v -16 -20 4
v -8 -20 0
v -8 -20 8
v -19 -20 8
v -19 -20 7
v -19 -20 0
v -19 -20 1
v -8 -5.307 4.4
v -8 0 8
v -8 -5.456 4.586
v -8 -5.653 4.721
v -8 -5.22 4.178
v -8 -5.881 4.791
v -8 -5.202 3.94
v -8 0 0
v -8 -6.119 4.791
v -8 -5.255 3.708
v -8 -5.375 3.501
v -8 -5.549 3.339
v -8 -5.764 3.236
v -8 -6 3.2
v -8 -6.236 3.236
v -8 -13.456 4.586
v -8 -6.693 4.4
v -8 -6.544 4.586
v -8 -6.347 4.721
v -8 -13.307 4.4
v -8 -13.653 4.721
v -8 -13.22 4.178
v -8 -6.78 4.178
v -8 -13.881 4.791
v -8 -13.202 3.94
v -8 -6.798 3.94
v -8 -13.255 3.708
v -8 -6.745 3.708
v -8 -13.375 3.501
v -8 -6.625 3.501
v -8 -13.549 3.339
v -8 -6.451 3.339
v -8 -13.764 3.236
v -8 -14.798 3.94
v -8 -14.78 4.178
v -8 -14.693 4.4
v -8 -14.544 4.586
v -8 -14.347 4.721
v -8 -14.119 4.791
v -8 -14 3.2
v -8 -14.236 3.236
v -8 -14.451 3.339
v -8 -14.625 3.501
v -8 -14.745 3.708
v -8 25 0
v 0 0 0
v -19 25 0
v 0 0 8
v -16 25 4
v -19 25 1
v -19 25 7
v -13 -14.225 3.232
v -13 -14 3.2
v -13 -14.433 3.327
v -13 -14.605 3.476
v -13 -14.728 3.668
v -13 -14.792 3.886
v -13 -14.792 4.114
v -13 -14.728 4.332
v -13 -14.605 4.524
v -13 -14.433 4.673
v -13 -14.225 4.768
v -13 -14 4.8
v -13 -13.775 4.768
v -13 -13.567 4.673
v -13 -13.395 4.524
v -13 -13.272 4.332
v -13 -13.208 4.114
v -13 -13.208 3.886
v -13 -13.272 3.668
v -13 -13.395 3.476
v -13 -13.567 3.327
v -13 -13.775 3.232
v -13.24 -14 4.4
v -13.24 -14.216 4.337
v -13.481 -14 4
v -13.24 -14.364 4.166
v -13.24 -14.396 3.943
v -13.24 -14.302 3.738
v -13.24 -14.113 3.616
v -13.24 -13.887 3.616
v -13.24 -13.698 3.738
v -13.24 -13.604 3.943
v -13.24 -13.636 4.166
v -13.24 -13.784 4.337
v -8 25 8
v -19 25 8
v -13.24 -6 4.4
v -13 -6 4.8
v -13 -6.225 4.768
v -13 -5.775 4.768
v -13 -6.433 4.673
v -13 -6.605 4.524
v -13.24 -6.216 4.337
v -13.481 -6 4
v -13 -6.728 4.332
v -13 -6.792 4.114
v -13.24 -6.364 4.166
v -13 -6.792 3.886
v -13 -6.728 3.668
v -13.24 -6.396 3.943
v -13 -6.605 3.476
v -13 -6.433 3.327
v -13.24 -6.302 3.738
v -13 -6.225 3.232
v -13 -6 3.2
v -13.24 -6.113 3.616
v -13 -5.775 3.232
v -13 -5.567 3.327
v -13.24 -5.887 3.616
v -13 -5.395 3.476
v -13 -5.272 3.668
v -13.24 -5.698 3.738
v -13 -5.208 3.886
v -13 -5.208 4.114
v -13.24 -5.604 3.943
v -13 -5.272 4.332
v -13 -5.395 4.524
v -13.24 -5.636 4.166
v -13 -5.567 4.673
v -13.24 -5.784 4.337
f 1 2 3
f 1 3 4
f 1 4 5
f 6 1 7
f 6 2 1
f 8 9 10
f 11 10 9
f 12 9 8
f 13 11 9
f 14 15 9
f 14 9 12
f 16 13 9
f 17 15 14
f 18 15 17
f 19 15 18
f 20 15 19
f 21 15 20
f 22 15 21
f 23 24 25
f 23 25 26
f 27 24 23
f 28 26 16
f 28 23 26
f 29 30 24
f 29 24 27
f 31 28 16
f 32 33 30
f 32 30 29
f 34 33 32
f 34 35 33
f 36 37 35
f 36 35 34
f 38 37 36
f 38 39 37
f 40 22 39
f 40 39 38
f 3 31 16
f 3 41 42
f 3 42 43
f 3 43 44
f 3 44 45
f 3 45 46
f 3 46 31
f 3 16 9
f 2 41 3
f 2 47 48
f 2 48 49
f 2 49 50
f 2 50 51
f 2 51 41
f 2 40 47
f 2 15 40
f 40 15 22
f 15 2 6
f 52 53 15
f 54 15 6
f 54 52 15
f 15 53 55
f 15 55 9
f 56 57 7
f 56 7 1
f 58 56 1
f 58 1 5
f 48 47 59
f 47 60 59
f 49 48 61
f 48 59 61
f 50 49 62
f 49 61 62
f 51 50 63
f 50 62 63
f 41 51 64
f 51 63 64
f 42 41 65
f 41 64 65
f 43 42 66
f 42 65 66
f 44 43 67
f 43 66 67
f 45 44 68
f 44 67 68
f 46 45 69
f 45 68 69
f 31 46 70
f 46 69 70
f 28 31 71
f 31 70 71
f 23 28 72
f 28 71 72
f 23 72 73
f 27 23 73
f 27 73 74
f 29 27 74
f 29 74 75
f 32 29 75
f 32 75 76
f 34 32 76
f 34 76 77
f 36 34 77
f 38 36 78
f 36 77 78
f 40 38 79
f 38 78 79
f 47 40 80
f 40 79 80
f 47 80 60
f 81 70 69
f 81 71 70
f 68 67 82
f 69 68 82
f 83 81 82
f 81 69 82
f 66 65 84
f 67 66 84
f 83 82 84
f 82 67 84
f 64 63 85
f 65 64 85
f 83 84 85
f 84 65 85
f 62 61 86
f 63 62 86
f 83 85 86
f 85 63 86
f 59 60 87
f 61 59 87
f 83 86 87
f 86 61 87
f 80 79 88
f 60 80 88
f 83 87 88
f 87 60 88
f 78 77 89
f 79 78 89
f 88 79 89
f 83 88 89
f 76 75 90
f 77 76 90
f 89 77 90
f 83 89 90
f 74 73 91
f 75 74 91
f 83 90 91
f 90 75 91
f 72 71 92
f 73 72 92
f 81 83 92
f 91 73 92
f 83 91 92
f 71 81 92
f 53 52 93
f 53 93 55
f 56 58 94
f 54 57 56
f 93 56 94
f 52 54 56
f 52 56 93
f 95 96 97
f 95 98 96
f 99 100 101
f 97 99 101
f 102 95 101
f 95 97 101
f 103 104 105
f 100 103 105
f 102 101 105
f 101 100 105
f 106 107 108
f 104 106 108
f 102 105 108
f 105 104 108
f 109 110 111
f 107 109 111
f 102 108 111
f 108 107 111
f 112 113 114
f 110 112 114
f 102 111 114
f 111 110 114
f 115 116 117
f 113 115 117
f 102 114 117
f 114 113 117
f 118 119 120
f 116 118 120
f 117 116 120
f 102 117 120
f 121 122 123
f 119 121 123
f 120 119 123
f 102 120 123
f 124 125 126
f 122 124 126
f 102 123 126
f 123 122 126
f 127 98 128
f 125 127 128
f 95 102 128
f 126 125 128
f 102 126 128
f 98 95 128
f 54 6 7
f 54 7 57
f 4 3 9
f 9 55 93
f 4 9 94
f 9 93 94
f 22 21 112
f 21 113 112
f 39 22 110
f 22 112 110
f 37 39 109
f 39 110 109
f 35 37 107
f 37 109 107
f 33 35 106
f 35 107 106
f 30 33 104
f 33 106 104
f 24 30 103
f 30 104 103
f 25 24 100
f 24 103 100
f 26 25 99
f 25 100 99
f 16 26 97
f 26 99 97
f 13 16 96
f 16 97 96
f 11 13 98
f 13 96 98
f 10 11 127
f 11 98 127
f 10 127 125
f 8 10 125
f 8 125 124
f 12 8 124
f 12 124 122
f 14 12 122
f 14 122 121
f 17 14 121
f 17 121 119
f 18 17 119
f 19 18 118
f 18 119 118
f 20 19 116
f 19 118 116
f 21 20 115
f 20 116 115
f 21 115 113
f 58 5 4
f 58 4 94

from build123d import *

# Parameters (mm, degrees)
BOSS_EXTRUDE1_DEPTH       = 8
CUT_EXTRUDE1_DEPTH        = 46
M2X0_4_TAPPED_HOLE1_D     = 1.6
M2X0_4_TAPPED_HOLE1_DEPTH = 5
M2X0_4_TAPPED_HOLE1_TIP   = 0.480688495


with BuildPart() as part:
    # Sketch1 → Boss-Extrude1 (new body)
    with BuildSketch(Plane.XY):
        Polygon((0, 0), (-8, 0), (-8, -20), (-19, -20), (-19, 25), (-8, 25), align=None)
    extrude(amount=BOSS_EXTRUDE1_DEPTH)

    # Sketch2 → Cut-Extrude1 (cut, through all)
    with BuildSketch(Plane(origin=(0, 25, 0), x_dir=(1, 0, 0), z_dir=(0, 1, 0))):
        Polygon((-19, -4), (-19, -1), (-16, -4), (-19, -7), align=None)
    extrude(amount=-CUT_EXTRUDE1_DEPTH, mode=Mode.SUBTRACT)

    # M2x0.4 Tapped Hole1
    with Locations(Plane(origin=(-8, -6, 4), x_dir=(0, 0, 1), z_dir=(1, 0, 0))):
        with Locations((0, 0), (0, 8)):
            Hole(M2X0_4_TAPPED_HOLE1_D / 2, depth=M2X0_4_TAPPED_HOLE1_DEPTH)
            with Locations((0, 0, -(M2X0_4_TAPPED_HOLE1_DEPTH + M2X0_4_TAPPED_HOLE1_TIP / 2))):  # 118° drill point
                Cone(0, M2X0_4_TAPPED_HOLE1_D / 2, M2X0_4_TAPPED_HOLE1_TIP, mode=Mode.SUBTRACT)


solid = part.part
